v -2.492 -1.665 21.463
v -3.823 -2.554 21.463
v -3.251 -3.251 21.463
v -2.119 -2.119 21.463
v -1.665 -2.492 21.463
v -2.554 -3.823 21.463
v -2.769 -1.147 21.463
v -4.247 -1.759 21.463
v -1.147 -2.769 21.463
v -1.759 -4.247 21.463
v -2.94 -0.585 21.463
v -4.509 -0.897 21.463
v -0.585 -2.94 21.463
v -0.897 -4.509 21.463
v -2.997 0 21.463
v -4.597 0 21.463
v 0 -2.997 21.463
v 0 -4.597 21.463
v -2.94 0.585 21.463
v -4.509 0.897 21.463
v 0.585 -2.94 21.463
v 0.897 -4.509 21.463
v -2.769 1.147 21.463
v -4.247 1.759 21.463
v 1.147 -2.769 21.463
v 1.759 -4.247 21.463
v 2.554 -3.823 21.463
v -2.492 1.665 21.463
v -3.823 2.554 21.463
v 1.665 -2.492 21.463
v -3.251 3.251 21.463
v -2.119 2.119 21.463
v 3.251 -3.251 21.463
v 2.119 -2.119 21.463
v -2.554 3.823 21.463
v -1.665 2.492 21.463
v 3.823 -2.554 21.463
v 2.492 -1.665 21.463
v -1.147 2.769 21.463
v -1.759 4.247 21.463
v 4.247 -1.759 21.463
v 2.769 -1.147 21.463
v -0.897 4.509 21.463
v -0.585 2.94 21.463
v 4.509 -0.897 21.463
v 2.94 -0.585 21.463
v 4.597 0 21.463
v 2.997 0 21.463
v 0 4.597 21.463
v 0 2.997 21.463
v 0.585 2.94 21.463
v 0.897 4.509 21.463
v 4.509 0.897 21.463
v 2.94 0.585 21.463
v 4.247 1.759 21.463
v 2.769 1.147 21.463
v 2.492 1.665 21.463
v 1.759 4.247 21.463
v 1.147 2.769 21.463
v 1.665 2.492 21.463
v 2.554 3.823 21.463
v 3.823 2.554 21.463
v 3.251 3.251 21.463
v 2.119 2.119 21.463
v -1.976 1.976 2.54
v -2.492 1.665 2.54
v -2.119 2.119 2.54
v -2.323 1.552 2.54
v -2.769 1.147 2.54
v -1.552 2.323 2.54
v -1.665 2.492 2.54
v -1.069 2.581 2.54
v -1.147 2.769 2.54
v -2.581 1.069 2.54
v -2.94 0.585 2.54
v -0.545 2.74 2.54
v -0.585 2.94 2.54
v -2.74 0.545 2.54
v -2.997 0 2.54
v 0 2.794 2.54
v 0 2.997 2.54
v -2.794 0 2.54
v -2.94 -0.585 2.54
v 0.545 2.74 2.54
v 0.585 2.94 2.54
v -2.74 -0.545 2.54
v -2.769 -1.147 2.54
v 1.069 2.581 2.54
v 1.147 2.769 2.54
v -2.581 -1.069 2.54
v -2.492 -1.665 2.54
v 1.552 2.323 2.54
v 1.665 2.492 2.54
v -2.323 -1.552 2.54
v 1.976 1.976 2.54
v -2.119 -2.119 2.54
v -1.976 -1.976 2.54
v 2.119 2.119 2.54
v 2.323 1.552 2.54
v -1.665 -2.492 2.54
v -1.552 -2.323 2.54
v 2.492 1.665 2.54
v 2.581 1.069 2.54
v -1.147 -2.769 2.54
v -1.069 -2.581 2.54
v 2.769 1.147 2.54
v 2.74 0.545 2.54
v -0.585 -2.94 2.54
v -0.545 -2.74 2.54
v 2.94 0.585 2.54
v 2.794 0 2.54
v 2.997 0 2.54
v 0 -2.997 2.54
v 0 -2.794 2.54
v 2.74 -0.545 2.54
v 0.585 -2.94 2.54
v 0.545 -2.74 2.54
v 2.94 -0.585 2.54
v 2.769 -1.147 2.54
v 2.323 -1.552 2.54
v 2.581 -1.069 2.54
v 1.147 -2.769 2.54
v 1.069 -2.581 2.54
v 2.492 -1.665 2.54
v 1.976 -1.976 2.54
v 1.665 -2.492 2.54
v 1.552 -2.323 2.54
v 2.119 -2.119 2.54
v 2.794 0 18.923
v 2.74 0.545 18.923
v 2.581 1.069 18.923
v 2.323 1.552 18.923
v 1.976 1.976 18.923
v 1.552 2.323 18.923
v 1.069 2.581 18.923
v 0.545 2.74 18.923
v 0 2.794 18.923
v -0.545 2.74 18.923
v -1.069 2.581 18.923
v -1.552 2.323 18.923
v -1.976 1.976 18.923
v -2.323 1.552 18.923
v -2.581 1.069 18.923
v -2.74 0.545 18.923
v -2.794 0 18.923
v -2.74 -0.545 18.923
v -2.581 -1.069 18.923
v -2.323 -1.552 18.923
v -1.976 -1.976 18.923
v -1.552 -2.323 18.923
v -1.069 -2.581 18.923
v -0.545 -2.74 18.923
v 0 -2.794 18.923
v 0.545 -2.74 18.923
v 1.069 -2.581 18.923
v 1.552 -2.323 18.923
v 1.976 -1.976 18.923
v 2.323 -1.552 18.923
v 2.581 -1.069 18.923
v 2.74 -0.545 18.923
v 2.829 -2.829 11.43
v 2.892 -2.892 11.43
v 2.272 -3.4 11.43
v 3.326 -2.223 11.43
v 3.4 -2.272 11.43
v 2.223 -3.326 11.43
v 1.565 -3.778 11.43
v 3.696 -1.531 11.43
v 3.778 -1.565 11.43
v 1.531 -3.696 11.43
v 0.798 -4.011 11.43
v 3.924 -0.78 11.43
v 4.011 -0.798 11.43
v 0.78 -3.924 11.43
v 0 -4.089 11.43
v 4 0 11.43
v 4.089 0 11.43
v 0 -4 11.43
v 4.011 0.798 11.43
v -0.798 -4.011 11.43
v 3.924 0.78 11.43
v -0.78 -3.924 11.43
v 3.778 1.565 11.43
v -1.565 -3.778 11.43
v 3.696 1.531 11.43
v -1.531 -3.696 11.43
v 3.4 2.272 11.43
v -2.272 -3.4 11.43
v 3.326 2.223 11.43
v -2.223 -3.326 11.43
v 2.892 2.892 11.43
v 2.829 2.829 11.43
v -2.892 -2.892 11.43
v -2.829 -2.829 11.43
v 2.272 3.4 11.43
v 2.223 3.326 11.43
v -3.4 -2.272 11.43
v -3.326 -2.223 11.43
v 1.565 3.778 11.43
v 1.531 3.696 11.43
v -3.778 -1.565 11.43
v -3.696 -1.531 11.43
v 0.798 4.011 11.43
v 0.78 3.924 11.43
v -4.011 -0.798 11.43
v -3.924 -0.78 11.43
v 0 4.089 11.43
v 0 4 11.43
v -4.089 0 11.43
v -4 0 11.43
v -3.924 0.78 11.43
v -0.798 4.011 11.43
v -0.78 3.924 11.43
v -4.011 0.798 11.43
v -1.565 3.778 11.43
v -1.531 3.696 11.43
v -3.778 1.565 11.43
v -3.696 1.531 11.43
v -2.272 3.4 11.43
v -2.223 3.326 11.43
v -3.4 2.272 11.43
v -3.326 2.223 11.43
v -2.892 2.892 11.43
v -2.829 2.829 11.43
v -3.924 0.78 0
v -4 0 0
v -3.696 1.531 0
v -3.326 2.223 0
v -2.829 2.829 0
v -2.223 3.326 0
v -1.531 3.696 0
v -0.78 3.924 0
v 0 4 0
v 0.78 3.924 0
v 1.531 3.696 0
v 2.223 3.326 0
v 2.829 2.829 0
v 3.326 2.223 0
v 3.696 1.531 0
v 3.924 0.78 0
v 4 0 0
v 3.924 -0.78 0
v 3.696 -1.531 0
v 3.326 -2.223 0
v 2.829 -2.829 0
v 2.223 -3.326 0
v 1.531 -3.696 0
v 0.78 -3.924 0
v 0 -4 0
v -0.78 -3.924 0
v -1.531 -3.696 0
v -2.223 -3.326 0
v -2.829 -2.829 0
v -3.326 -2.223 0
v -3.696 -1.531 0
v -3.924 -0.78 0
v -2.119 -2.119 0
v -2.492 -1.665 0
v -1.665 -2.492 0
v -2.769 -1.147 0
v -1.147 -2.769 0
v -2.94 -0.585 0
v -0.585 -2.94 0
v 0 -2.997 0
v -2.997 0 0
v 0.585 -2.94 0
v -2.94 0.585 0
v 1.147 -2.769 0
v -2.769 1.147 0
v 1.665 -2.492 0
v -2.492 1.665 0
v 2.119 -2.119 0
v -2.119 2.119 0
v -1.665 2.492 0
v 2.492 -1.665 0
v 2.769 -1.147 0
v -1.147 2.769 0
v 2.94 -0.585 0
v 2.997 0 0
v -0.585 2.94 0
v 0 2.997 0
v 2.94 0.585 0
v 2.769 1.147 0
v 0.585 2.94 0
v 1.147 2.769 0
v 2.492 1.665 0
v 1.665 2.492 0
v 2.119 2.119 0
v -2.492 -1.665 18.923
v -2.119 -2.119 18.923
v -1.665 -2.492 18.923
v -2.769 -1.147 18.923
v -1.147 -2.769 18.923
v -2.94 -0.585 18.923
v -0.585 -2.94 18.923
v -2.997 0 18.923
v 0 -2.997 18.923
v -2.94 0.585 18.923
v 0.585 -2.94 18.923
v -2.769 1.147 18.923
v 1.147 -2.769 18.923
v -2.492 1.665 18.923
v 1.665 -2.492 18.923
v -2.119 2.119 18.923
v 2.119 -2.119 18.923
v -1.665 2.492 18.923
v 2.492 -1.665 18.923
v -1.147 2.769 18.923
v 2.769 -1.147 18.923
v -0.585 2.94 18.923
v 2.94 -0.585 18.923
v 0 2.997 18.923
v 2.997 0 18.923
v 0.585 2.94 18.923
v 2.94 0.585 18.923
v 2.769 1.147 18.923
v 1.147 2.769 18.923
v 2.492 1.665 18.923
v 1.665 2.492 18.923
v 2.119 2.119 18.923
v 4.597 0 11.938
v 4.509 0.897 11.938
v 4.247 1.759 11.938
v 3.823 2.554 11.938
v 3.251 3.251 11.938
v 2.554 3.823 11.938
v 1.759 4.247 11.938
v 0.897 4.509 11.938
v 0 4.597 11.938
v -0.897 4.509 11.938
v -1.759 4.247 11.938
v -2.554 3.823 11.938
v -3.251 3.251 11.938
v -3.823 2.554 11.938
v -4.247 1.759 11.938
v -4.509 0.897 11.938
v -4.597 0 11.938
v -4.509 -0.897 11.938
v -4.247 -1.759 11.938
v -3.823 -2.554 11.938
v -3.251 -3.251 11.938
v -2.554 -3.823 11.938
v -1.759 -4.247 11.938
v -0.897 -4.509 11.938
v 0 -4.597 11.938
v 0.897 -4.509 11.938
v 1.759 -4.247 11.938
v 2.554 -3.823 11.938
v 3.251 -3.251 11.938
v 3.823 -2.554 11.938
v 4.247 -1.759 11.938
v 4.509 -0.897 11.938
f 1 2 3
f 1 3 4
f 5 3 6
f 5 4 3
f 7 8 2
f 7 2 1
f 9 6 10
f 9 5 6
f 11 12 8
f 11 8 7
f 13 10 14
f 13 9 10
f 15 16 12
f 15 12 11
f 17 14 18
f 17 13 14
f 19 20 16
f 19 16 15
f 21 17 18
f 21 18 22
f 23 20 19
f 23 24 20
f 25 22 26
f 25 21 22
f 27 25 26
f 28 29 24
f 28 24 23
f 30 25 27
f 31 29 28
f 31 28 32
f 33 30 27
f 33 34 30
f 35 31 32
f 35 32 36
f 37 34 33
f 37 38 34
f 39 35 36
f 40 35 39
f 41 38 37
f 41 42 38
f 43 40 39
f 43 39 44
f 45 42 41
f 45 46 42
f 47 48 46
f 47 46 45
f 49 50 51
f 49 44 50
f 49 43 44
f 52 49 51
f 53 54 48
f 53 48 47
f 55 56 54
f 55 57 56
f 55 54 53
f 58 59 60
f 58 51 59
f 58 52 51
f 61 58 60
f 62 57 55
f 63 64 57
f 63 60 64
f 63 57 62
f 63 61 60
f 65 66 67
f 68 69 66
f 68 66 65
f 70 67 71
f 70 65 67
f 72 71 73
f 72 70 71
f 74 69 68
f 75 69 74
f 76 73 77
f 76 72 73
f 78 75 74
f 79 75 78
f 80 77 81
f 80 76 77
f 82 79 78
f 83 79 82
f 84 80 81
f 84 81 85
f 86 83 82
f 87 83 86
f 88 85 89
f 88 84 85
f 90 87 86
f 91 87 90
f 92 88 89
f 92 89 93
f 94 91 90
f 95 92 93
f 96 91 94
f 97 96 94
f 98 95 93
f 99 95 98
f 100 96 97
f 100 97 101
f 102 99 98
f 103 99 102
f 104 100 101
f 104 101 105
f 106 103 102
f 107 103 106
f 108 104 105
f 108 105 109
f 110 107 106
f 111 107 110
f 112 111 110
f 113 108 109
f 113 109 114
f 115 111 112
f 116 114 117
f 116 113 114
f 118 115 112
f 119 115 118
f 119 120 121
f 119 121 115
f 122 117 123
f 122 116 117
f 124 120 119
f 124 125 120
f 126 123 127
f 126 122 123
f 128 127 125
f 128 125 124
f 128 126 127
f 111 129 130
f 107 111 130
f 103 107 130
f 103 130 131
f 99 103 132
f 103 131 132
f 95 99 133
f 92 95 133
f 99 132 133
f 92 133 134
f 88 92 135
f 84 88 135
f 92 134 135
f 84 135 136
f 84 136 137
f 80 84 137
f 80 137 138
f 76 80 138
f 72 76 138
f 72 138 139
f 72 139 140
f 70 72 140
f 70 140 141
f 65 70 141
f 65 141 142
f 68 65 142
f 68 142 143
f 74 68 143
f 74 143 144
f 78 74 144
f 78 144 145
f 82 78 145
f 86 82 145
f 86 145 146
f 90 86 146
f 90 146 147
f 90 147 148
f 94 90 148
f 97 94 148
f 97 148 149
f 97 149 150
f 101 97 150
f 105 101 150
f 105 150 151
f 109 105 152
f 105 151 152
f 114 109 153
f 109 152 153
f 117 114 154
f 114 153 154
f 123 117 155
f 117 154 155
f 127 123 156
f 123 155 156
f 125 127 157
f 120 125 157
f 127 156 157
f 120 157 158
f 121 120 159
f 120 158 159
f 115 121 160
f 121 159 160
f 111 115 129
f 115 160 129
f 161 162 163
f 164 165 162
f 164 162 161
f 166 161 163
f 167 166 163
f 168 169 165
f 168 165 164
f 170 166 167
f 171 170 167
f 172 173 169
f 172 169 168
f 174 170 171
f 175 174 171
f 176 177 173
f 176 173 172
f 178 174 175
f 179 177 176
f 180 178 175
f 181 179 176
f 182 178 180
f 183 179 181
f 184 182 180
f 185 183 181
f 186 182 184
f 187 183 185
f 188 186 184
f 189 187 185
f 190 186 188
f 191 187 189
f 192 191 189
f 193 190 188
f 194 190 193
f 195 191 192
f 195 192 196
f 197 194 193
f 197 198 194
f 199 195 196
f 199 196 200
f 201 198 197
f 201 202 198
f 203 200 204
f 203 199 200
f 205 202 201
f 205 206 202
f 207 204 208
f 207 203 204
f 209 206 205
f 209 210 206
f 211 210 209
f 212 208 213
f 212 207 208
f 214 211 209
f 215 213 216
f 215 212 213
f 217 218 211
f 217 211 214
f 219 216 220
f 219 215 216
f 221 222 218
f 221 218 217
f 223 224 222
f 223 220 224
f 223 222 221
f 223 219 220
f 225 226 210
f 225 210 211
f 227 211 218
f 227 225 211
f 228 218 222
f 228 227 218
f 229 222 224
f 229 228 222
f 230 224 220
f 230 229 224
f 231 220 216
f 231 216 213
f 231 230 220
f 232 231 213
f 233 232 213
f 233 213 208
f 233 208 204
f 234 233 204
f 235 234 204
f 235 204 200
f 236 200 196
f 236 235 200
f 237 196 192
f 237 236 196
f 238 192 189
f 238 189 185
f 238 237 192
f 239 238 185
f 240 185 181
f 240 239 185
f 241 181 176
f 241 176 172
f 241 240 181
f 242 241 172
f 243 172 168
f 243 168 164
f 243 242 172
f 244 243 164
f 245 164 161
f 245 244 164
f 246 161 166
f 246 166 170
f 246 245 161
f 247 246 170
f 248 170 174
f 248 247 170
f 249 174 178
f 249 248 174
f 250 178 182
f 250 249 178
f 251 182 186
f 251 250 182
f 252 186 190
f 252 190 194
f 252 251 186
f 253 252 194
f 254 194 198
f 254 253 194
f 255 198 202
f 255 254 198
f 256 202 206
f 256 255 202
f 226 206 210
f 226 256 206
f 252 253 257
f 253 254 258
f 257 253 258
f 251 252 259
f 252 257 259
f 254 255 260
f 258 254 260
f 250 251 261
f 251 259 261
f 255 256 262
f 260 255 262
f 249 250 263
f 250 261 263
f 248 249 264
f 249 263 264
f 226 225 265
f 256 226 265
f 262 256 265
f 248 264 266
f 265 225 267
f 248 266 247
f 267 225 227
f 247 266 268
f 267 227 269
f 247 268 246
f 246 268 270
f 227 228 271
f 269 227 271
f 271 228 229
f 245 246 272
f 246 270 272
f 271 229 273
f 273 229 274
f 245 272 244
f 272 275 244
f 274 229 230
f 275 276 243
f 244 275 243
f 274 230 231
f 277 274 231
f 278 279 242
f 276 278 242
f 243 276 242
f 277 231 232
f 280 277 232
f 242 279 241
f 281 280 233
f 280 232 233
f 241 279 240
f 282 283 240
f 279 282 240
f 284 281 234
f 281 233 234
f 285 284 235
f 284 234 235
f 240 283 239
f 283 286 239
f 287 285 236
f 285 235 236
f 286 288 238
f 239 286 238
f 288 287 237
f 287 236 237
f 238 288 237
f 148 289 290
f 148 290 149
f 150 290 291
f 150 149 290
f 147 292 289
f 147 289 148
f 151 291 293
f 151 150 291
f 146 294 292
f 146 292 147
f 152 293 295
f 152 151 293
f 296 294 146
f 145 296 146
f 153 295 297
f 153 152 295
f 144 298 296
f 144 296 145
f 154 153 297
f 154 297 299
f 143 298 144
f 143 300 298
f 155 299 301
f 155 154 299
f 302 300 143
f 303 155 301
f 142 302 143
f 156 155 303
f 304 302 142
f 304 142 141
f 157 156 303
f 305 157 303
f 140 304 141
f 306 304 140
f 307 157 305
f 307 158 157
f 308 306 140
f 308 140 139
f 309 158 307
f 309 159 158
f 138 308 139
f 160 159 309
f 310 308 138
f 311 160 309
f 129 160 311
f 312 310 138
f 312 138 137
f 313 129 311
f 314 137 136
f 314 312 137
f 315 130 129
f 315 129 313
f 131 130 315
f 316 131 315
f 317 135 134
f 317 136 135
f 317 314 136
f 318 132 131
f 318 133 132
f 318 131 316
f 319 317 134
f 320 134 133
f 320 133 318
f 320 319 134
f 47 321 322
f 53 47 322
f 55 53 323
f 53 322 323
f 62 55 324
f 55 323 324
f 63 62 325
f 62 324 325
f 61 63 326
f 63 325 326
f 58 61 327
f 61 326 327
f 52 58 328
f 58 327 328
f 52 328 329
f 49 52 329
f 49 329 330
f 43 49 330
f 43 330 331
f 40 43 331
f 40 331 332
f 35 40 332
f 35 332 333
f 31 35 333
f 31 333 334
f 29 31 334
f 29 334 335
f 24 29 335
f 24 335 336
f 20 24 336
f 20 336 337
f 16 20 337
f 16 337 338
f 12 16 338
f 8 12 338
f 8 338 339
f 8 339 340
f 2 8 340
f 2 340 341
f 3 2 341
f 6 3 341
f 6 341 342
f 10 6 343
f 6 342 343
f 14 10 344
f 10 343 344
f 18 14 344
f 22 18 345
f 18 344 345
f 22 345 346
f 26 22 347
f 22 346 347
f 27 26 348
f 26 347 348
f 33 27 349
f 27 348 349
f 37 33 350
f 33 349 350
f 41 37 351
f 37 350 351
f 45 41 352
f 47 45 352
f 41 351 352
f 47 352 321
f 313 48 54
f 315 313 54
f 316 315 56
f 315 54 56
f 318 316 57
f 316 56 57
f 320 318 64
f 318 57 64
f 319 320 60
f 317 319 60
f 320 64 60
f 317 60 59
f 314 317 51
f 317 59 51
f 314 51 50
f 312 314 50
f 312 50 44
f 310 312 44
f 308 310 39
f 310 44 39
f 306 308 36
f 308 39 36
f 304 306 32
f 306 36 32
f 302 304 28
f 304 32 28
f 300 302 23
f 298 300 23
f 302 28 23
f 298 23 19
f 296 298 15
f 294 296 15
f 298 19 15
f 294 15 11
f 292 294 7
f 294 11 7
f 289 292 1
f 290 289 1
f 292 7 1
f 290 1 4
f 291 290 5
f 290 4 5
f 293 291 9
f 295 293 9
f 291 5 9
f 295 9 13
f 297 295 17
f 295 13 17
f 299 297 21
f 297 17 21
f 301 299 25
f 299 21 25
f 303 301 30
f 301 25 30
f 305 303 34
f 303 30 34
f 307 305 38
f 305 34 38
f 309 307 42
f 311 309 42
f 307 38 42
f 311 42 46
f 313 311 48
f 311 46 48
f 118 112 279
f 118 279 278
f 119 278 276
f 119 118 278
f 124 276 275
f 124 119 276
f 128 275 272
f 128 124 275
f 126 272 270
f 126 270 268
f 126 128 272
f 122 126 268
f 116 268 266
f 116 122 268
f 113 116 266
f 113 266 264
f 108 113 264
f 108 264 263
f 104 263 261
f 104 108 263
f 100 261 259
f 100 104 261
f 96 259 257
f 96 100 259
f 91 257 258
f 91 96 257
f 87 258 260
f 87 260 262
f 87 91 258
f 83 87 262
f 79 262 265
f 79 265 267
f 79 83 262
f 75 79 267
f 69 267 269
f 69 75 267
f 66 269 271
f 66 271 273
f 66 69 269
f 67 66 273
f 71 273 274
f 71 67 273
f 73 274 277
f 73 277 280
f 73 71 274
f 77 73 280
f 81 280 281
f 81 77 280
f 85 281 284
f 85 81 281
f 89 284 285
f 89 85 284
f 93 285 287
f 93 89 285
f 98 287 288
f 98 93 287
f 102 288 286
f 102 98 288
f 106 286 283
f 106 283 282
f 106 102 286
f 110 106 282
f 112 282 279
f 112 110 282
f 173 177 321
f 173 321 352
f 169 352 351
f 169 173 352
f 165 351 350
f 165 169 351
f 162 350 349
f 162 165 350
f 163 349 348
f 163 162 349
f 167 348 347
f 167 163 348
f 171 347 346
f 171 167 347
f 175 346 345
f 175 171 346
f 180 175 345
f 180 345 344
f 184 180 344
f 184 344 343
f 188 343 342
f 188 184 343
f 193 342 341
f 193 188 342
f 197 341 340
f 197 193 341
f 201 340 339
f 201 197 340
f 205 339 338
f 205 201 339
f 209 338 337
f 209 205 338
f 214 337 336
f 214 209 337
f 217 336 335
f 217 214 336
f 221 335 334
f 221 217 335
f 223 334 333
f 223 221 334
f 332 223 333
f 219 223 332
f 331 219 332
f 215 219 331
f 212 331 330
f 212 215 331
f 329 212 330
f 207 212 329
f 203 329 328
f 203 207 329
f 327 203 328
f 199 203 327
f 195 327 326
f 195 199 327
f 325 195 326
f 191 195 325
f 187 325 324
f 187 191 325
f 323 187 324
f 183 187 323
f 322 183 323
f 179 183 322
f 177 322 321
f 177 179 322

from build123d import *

# Parameters (mm, degrees)
SKETCH1_R          = 4.5974
EXTRUDE1_DEPTH     = 21.463
SKETCH3_R          = 2.794
CUT_EXTRUDE2_DEPTH = 23.426157551
SKETCH4_R          = 2.9972
CUT_EXTRUDE3_DEPTH = 2.54
SKETCH5_OUTSIDE_W  = 16.212
SKETCH5_OUTSIDE_H  = 16.212
SKETCH5_OUTSIDE_R  = 4.0005
CUT_EXTRUDE4_DEPTH = 11.43
CUT_EXTRUDE5_START = -2.54
SKETCH6_R          = 2.9972
CUT_EXTRUDE5_DEPTH = 2.54
CHAMFER1_SIZE      = 0.508


with BuildPart() as part:
    # Sketch1 → Extrude1 (new body)
    with BuildSketch(Plane.XY):
        Circle(SKETCH1_R)
    extrude(amount=EXTRUDE1_DEPTH)

    # Sketch3 → Cut-Extrude2 (cut, through all)
    with BuildSketch(Plane.XY.offset(21.463)):
        Circle(SKETCH3_R)
    extrude(amount=-CUT_EXTRUDE2_DEPTH, mode=Mode.SUBTRACT)

    # Sketch4 → Cut-Extrude3 (cut)
    with BuildSketch(Plane.XY.offset(21.463)):
        Circle(SKETCH4_R)
    extrude(amount=-CUT_EXTRUDE3_DEPTH, mode=Mode.SUBTRACT)

    # Sketch5 outside → Cut-Extrude4 (cut)
    with BuildSketch(Plane(origin=(0, 0, 0), x_dir=(-1, 0, 0), z_dir=(0, 0, -1))):
        Rectangle(SKETCH5_OUTSIDE_W, SKETCH5_OUTSIDE_H)
        Circle(SKETCH5_OUTSIDE_R, mode=Mode.SUBTRACT)
    extrude(amount=-CUT_EXTRUDE4_DEPTH, mode=Mode.SUBTRACT)

    # Sketch6 → Cut-Extrude5 (cut)
    with BuildSketch(Plane(origin=(0, 0, 0), x_dir=(-1, 0, 0), z_dir=(0, 0, -1)).offset(CUT_EXTRUDE5_START)):
        with Locations(Location((0, 0, 0), (0, 0, 180))):
            Circle(SKETCH6_R)
    extrude(amount=CUT_EXTRUDE5_DEPTH, mode=Mode.SUBTRACT)

    # Chamfer1
    chamfer1_edges = [part.edges().sort_by_distance(p)[0] for p in [
        (-4.5974, 0, 11.43),
    ]]
    chamfer(chamfer1_edges, length=CHAMFER1_SIZE)


solid = part.part
